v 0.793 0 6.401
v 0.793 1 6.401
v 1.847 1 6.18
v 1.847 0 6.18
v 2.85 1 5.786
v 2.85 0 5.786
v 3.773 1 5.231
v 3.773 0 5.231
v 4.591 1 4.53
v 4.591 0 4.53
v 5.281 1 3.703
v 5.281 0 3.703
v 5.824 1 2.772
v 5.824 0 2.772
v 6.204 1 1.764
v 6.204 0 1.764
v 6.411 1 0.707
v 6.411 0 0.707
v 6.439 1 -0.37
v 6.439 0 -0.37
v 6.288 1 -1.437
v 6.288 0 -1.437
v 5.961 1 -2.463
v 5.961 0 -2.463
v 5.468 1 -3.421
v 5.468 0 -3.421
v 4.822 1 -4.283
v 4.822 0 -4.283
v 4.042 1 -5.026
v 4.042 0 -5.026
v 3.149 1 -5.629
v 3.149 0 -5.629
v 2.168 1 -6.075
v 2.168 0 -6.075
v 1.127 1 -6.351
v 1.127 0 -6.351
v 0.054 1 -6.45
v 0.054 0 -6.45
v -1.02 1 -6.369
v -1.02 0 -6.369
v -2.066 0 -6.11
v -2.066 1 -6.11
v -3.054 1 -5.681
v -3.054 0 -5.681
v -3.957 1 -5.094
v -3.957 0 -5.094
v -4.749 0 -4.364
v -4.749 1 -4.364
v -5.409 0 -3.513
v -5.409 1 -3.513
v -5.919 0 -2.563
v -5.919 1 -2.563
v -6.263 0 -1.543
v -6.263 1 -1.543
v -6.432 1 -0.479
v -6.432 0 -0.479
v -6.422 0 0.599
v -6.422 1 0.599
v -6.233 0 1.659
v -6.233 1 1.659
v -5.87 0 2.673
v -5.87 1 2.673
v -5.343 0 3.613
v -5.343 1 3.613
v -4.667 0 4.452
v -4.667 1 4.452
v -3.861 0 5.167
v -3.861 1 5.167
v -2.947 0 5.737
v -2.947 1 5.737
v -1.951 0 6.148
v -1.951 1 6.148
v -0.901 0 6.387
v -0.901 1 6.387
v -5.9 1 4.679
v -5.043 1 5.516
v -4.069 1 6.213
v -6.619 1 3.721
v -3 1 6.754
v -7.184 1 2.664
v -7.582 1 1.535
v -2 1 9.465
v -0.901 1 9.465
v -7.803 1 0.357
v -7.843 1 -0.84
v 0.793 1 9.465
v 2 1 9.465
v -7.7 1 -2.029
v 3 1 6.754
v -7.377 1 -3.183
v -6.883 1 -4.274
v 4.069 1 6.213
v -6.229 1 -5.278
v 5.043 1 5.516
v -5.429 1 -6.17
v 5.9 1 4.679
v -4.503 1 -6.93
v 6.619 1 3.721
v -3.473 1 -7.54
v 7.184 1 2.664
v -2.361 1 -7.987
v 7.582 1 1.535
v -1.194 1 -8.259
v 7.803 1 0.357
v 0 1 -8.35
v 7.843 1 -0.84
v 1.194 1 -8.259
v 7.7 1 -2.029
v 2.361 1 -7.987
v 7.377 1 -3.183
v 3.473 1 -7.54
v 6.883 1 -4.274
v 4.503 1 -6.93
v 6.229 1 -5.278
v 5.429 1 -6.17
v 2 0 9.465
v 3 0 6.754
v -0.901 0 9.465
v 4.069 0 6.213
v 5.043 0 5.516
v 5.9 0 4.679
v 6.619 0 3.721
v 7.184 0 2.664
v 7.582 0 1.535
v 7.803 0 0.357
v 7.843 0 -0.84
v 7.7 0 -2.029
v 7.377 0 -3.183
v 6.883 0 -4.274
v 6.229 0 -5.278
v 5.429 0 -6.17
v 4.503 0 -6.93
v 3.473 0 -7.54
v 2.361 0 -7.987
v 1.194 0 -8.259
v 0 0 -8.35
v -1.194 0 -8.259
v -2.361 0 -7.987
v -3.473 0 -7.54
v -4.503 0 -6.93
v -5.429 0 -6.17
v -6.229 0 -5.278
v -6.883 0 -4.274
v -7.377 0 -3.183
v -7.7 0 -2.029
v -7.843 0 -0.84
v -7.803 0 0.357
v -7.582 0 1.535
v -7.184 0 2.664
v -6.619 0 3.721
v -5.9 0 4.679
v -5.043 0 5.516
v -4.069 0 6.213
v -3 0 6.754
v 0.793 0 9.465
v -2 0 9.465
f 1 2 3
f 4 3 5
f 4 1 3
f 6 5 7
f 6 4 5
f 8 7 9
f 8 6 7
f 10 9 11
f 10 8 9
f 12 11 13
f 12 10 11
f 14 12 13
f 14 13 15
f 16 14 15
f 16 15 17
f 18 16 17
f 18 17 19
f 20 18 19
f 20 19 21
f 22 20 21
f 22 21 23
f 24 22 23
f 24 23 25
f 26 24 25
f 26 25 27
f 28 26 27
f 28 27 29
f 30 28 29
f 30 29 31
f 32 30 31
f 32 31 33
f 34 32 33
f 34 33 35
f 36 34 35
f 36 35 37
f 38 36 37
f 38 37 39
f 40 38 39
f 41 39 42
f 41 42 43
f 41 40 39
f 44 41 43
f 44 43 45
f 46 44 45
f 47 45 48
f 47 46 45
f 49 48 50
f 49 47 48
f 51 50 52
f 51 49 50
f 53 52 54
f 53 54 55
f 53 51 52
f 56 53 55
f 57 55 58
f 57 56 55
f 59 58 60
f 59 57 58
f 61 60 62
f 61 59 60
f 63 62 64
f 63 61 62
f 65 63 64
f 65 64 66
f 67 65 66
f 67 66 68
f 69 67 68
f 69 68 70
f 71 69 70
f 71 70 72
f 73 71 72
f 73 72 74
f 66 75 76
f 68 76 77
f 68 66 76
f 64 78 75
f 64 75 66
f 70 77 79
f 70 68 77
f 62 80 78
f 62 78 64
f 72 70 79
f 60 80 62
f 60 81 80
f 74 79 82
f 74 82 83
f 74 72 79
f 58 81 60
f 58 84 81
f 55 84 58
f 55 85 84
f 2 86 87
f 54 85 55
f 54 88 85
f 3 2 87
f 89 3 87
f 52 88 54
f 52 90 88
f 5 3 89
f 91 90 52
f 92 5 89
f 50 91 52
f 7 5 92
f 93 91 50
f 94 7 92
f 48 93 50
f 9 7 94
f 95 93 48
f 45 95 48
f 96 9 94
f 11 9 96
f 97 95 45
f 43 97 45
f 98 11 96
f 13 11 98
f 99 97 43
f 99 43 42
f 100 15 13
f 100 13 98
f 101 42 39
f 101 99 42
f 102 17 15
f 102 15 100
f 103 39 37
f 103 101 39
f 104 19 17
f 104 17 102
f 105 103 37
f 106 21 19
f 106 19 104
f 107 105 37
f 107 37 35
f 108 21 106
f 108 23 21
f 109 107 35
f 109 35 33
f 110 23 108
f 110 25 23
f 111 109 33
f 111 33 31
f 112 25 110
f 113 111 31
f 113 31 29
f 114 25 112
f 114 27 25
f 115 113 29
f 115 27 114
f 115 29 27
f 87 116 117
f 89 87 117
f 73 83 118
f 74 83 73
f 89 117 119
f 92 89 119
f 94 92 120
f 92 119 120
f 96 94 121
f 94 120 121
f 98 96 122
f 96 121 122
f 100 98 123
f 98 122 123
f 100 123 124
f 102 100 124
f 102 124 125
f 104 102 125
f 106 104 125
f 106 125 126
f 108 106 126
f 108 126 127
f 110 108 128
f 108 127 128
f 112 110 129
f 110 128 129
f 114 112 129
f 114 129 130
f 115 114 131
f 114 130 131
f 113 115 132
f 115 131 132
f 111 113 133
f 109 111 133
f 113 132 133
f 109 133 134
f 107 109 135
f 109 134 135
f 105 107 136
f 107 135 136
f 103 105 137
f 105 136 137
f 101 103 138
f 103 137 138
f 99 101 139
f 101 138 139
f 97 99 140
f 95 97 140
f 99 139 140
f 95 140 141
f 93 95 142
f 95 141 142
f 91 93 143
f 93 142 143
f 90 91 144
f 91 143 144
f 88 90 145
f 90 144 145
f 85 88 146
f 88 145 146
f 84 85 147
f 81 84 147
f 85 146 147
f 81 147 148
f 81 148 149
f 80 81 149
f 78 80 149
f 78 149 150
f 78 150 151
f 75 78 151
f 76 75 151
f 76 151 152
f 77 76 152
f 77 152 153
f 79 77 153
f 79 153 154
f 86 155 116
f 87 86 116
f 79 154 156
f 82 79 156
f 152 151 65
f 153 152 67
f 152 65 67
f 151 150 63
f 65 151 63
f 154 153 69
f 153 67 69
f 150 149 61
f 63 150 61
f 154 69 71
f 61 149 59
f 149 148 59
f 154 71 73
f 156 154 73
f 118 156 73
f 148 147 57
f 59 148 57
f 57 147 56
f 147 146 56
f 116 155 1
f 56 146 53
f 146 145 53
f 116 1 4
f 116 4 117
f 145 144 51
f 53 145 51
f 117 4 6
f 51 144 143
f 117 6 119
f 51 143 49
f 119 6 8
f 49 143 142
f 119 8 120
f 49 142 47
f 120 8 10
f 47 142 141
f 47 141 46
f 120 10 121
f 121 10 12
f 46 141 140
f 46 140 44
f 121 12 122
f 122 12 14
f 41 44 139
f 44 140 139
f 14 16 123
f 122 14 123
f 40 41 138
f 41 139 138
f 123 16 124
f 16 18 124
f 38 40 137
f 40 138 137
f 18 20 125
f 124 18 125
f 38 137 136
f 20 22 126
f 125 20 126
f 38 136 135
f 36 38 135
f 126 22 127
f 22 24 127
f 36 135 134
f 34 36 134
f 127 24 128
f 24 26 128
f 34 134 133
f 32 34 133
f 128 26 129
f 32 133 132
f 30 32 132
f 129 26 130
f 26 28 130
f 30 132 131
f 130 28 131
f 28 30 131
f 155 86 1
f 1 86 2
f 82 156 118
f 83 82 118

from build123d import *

# Parameters (mm, degrees)
SKETCH_1_R          = 6.45
EXTRUDE_1_DEPTH     = 1
SKETCH_2_W          = 1.693962672
SKETCH_2_H          = 6.211196465
CUT_EXTRUDE_1_DEPTH = 10


with BuildPart() as part:
    # 草图1 → 凸台-拉伸1 (new body)
    with BuildSketch(Plane(origin=(0, 0, 0), x_dir=(1, 0, 0), z_dir=(0, 1, 0))):
        with BuildLine():
            Line((0, -9.465309979), (2, -9.465309979))
            Line((2, -9.465309979), (3, -6.754136751))
            ThreePointArc((3, -6.754136751), (0, 8.35), (-3, -6.754136751))
            Line((-3, -6.754136751), (-2, -9.465309979))
            Line((-2, -9.465309979), (0, -9.465309979))
        make_face()
        with Locations(Location((0, 0, 0), (0, 0, 270))):
            Circle(SKETCH_1_R, mode=Mode.SUBTRACT)
    extrude(amount=EXTRUDE_1_DEPTH)

    # 草图2 → 切除-拉伸1 (cut)
    with BuildSketch(Plane(origin=(0, 1, 0), x_dir=(1, 0, 0), z_dir=(0, 1, 0))):
        with Locations((-0.053964614, -8.617371485)):
            Rectangle(SKETCH_2_W, SKETCH_2_H)
    extrude(amount=-CUT_EXTRUDE_1_DEPTH, mode=Mode.SUBTRACT)


solid = part.part
